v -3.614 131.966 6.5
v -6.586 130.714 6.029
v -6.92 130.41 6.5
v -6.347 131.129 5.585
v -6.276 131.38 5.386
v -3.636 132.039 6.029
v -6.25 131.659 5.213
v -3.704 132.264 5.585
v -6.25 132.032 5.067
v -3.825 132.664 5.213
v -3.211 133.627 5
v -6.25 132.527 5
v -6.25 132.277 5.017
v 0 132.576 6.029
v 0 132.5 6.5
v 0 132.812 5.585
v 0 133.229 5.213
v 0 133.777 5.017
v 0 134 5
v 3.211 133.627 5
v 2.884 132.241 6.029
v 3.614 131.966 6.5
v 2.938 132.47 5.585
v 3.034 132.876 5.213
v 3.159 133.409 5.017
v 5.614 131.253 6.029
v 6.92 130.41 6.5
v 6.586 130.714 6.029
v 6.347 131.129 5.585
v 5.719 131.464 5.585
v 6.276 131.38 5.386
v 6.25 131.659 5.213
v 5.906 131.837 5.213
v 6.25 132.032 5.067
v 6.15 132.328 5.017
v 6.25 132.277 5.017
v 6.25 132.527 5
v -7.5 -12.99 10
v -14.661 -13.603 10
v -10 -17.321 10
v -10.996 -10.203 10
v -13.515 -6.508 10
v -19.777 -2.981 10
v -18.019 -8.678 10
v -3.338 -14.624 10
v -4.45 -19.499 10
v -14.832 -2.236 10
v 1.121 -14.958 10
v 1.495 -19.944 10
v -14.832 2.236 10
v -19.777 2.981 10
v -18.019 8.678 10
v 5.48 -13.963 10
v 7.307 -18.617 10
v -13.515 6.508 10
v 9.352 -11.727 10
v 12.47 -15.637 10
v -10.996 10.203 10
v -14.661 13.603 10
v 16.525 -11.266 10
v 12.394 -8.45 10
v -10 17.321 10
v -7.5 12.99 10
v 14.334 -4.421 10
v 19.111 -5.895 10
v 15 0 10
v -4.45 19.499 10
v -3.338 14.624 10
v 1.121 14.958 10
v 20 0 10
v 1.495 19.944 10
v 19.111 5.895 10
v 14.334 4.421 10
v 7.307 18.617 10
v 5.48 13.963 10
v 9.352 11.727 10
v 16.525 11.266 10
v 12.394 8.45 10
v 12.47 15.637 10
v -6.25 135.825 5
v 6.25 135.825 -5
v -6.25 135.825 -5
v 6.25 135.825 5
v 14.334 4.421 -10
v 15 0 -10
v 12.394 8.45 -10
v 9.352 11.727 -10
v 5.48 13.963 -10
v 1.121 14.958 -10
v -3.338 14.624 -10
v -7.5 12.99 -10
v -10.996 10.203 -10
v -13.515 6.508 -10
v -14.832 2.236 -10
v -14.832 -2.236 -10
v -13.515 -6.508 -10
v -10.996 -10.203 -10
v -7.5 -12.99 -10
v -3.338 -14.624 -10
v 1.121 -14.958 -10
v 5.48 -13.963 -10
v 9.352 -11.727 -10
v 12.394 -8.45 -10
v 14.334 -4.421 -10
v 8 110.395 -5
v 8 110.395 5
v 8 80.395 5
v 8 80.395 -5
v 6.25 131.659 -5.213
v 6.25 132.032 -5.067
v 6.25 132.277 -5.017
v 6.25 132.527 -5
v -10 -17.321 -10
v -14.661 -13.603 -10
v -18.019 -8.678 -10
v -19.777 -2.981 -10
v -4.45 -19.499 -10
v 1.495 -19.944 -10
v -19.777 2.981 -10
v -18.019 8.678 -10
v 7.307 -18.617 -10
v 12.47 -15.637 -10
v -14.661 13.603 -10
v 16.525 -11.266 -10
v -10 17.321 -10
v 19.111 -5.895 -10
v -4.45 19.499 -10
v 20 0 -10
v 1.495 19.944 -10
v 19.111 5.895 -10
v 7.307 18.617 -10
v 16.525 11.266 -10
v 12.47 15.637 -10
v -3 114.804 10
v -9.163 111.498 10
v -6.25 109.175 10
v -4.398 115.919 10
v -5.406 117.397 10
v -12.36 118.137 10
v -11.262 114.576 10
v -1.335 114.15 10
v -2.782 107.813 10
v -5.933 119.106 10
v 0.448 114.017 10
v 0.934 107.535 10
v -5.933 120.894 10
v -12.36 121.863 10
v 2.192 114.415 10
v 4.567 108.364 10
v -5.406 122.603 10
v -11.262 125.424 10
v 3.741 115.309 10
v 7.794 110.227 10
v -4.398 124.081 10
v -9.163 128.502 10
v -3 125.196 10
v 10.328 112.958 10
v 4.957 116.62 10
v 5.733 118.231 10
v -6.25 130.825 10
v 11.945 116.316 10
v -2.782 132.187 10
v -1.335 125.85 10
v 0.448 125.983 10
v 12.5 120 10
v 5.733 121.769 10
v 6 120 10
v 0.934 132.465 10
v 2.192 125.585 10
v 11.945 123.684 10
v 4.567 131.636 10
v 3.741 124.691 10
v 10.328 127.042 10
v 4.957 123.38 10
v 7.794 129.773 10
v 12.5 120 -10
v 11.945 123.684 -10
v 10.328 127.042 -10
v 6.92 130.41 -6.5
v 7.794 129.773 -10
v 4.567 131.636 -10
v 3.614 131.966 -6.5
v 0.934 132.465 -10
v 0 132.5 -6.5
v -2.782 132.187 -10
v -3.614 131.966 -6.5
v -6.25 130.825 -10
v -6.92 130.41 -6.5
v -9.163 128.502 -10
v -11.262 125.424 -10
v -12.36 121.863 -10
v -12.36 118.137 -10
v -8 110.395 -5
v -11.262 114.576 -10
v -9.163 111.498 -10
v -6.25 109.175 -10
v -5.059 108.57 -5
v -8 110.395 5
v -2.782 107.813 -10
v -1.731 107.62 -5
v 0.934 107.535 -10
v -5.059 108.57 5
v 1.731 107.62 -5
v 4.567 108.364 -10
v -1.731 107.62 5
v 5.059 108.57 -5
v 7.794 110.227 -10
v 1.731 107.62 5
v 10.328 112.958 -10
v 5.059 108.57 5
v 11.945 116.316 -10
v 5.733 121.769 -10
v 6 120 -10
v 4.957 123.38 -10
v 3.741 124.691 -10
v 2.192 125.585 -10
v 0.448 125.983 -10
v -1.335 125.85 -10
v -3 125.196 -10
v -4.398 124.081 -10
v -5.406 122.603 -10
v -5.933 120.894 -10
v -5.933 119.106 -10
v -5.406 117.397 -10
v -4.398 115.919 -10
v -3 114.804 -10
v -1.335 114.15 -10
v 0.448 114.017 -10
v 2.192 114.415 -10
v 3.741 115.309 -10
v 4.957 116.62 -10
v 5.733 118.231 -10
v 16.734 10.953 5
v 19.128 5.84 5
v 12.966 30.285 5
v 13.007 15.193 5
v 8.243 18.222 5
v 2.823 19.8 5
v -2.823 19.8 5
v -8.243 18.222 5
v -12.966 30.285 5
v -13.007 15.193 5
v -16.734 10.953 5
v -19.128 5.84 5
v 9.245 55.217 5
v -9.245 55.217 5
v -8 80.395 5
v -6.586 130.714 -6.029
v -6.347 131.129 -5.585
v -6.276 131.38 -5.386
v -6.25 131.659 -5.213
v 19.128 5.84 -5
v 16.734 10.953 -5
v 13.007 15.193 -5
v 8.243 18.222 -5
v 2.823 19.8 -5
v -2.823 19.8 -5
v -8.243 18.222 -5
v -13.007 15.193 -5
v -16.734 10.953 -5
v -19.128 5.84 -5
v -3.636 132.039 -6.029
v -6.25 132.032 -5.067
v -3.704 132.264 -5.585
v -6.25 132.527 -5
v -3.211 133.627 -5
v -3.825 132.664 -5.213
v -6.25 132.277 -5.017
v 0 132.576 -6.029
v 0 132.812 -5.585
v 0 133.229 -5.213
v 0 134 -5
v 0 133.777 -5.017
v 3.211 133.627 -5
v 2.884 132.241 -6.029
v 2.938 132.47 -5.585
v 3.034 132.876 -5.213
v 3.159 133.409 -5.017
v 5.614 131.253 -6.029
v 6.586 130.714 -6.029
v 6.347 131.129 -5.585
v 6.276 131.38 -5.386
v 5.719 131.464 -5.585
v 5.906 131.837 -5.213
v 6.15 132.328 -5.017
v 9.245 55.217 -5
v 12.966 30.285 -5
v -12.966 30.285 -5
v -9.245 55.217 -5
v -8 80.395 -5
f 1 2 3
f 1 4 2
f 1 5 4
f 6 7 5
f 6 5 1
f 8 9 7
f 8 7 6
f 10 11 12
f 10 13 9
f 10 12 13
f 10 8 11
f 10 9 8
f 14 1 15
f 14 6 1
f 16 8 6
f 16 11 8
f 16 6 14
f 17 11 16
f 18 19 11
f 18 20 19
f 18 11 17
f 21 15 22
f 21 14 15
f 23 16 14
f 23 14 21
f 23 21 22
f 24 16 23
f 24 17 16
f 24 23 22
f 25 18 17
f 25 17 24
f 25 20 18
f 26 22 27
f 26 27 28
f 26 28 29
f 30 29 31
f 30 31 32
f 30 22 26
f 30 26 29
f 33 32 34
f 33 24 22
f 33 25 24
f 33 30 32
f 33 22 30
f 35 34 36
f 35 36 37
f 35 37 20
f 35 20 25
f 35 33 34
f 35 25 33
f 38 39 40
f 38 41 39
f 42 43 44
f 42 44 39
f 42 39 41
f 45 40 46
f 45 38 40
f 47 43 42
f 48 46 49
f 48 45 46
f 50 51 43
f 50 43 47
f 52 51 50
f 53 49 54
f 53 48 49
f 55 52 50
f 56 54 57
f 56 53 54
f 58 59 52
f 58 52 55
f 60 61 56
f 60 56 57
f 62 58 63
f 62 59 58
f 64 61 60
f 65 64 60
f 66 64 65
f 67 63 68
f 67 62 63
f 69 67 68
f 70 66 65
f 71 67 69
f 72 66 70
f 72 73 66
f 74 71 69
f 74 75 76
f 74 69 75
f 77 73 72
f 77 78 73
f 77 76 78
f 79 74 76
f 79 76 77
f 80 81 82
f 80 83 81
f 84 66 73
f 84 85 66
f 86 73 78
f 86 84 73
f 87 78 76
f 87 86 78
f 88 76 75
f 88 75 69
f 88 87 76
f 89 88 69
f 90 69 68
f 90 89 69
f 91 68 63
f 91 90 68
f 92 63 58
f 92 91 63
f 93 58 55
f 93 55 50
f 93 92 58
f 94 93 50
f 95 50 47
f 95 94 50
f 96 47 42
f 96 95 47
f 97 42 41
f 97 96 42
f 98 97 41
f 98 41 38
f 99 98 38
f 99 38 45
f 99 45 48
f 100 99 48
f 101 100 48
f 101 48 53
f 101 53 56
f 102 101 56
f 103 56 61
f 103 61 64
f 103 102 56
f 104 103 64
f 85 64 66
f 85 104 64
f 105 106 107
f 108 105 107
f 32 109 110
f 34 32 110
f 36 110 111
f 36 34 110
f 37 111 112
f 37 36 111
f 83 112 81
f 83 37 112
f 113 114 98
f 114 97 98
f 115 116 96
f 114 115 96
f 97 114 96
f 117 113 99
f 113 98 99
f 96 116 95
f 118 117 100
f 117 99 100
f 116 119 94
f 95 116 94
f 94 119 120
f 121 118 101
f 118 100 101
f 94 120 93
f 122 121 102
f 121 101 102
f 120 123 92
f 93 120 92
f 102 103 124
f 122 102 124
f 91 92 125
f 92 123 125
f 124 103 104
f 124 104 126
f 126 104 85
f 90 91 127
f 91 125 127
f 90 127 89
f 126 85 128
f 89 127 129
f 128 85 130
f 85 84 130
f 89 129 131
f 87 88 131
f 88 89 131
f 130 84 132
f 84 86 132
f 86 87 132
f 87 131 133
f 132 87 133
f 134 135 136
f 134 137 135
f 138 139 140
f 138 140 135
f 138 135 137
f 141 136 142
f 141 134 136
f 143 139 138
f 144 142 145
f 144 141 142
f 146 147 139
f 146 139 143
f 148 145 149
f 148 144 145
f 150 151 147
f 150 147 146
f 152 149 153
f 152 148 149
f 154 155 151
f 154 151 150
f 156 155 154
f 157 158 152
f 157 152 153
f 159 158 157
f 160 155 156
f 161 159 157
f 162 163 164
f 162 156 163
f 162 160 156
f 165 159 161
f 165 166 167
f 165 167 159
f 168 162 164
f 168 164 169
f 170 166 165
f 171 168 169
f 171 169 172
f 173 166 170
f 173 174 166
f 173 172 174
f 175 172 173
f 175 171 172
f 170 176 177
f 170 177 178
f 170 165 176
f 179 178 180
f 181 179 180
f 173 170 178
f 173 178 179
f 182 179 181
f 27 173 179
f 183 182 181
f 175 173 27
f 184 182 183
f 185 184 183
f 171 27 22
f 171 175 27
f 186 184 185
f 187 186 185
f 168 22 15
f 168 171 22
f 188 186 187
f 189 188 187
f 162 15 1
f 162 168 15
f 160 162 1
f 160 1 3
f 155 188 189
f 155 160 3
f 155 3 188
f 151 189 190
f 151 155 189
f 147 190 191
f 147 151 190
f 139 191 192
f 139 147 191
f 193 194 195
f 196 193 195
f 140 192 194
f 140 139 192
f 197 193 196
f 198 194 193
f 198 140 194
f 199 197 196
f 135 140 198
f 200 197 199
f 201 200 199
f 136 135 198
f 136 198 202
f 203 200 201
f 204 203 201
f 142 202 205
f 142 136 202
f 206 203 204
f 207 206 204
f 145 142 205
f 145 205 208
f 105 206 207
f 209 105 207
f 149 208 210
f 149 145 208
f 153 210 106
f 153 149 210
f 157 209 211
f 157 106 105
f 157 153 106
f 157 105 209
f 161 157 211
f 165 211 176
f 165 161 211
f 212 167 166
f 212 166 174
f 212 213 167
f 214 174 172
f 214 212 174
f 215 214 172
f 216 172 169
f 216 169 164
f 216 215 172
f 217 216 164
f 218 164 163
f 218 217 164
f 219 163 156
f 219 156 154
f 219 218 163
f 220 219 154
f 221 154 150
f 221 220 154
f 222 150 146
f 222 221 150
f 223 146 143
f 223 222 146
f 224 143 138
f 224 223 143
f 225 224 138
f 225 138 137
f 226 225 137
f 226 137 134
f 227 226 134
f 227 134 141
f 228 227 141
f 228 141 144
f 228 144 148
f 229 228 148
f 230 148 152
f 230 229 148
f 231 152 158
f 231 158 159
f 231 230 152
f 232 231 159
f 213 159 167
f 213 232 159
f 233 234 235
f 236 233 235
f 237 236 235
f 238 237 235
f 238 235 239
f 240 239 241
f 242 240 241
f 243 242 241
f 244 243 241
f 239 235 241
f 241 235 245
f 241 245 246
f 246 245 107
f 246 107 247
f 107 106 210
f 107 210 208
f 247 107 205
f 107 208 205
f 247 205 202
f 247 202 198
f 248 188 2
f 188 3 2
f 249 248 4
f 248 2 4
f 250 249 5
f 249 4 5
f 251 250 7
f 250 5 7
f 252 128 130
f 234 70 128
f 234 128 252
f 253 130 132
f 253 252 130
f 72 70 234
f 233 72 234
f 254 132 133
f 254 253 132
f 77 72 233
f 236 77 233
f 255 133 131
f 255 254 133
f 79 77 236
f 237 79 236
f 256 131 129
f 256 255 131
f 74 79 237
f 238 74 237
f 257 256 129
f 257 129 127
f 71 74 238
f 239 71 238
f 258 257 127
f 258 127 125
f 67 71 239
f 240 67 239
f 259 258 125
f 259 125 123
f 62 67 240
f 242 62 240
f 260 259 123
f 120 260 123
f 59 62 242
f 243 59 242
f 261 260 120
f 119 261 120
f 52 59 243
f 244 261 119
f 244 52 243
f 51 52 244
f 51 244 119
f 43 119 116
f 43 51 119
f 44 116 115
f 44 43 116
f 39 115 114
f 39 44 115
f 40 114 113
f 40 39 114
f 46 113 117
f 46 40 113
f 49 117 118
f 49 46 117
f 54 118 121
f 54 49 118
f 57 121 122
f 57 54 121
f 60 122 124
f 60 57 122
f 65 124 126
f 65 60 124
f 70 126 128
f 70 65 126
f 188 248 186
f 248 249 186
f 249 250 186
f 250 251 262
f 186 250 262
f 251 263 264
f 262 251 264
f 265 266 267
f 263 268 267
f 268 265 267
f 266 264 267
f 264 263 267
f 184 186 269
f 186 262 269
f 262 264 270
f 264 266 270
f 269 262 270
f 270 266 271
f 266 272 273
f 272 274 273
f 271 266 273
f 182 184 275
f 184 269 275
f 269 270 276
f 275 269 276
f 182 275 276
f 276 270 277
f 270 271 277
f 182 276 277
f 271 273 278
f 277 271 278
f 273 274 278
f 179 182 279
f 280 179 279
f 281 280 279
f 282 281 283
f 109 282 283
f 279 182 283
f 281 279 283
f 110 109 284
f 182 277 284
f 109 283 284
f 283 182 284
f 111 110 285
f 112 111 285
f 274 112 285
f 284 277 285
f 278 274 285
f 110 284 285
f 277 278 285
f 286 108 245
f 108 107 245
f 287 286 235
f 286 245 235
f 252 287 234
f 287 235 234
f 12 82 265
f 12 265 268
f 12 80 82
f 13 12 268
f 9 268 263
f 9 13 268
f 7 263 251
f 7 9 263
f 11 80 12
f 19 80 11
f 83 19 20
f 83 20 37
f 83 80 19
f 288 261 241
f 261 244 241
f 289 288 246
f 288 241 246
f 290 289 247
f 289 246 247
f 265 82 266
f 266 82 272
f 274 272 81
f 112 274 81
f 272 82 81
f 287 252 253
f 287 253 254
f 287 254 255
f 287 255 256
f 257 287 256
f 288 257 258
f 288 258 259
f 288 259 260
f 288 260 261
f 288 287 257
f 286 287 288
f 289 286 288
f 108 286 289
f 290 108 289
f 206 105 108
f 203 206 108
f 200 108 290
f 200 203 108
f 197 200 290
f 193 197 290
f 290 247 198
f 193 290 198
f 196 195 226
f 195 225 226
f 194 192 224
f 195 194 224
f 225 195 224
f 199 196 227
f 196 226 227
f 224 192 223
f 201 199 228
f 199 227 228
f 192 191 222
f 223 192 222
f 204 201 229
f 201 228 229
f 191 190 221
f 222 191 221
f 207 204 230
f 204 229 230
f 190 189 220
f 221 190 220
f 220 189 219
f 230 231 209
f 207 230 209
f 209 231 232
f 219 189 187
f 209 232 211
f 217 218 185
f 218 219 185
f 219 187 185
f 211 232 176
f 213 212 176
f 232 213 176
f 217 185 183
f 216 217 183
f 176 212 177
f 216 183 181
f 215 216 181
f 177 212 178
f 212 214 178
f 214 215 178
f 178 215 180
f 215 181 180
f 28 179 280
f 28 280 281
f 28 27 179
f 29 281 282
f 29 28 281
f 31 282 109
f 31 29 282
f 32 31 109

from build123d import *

# Parameters (mm, degrees)
SKETCH3_R             = 20
SKETCH3_R_2           = 15
BOSS_EXTRUDE3_DEPTH   = 10
SKETCH3_R_3           = 12.5
SKETCH3_R_4           = 6
BOSS_EXTRUDE3_2_DEPTH = 10
BOSS_EXTRUDE4_DEPTH   = 5
BOSS_EXTRUDE5_DEPTH   = 5
FILLET1_R             = 1.5


with BuildPart() as part:
    # Sketch3 → Boss-Extrude3 (new body, symmetric)
    with BuildSketch(Plane.XY):
        Circle(SKETCH3_R)
        Circle(SKETCH3_R_2, mode=Mode.SUBTRACT)
    extrude(amount=BOSS_EXTRUDE3_DEPTH, both=True)



with BuildPart() as body_2:
    # Sketch3 → Boss-Extrude3 2 (new body, symmetric)
    with BuildSketch(Plane.XY):
        with Locations((0, 120)):
            Circle(SKETCH3_R_3)
        with Locations((0, 120)):
            Circle(SKETCH3_R_4, mode=Mode.SUBTRACT)
    extrude(amount=BOSS_EXTRUDE3_2_DEPTH, both=True)


with BuildPart() as part_1:
    add(part.part)

    add(body_2.part)  # Boss-Extrude4 merges body 2
    # Sketch4 → Boss-Extrude4 (add, symmetric)
    with BuildSketch(Plane.XY):
        with BuildLine():
            Line((8, 110.395313644), (8, 80.395313644))
            ThreePointArc((8, 80.395313644), (10.797388085, 42.704875811), (19.128250996, 5.840377886))
            ThreePointArc((19.128250996, 5.840377886), (0, 20), (-19.128250996, 5.840377886))
            ThreePointArc((-19.128250996, 5.840377886), (-10.797388085, 42.704875811), (-8, 80.395313644))
            Line((-8, 80.395313644), (-8, 110.395313644))
            ThreePointArc((-8, 110.395313644), (0, 107.5), (8, 110.395313644))
        make_face()
    extrude(amount=BOSS_EXTRUDE4_DEPTH, both=True)

    # Sketch5 → Boss-Extrude5 (add, symmetric)
    with BuildSketch(Plane.XY):
        with BuildLine():
            Line((-6.25, 135.825317547), (-6.25, 130.825317547))
            ThreePointArc((-6.25, 130.825317547), (0, 132.5), (6.25, 130.825317547))
            Line((6.25, 130.825317547), (6.25, 135.825317547))
            Line((6.25, 135.825317547), (-6.25, 135.825317547))
        make_face()
    extrude(amount=BOSS_EXTRUDE5_DEPTH, both=True)

    # Fillet1
    fillet1_edges = [part_1.edges().sort_by_distance(p)[0] for p in [
        (0, 132.5, -5),
        (-6.25, 130.825317547, 0),
        (6.25, 130.825317547, 0),
        (0, 132.5, 5),
    ]]
    fillet(fillet1_edges, radius=FILLET1_R)


solid = part_1.part
